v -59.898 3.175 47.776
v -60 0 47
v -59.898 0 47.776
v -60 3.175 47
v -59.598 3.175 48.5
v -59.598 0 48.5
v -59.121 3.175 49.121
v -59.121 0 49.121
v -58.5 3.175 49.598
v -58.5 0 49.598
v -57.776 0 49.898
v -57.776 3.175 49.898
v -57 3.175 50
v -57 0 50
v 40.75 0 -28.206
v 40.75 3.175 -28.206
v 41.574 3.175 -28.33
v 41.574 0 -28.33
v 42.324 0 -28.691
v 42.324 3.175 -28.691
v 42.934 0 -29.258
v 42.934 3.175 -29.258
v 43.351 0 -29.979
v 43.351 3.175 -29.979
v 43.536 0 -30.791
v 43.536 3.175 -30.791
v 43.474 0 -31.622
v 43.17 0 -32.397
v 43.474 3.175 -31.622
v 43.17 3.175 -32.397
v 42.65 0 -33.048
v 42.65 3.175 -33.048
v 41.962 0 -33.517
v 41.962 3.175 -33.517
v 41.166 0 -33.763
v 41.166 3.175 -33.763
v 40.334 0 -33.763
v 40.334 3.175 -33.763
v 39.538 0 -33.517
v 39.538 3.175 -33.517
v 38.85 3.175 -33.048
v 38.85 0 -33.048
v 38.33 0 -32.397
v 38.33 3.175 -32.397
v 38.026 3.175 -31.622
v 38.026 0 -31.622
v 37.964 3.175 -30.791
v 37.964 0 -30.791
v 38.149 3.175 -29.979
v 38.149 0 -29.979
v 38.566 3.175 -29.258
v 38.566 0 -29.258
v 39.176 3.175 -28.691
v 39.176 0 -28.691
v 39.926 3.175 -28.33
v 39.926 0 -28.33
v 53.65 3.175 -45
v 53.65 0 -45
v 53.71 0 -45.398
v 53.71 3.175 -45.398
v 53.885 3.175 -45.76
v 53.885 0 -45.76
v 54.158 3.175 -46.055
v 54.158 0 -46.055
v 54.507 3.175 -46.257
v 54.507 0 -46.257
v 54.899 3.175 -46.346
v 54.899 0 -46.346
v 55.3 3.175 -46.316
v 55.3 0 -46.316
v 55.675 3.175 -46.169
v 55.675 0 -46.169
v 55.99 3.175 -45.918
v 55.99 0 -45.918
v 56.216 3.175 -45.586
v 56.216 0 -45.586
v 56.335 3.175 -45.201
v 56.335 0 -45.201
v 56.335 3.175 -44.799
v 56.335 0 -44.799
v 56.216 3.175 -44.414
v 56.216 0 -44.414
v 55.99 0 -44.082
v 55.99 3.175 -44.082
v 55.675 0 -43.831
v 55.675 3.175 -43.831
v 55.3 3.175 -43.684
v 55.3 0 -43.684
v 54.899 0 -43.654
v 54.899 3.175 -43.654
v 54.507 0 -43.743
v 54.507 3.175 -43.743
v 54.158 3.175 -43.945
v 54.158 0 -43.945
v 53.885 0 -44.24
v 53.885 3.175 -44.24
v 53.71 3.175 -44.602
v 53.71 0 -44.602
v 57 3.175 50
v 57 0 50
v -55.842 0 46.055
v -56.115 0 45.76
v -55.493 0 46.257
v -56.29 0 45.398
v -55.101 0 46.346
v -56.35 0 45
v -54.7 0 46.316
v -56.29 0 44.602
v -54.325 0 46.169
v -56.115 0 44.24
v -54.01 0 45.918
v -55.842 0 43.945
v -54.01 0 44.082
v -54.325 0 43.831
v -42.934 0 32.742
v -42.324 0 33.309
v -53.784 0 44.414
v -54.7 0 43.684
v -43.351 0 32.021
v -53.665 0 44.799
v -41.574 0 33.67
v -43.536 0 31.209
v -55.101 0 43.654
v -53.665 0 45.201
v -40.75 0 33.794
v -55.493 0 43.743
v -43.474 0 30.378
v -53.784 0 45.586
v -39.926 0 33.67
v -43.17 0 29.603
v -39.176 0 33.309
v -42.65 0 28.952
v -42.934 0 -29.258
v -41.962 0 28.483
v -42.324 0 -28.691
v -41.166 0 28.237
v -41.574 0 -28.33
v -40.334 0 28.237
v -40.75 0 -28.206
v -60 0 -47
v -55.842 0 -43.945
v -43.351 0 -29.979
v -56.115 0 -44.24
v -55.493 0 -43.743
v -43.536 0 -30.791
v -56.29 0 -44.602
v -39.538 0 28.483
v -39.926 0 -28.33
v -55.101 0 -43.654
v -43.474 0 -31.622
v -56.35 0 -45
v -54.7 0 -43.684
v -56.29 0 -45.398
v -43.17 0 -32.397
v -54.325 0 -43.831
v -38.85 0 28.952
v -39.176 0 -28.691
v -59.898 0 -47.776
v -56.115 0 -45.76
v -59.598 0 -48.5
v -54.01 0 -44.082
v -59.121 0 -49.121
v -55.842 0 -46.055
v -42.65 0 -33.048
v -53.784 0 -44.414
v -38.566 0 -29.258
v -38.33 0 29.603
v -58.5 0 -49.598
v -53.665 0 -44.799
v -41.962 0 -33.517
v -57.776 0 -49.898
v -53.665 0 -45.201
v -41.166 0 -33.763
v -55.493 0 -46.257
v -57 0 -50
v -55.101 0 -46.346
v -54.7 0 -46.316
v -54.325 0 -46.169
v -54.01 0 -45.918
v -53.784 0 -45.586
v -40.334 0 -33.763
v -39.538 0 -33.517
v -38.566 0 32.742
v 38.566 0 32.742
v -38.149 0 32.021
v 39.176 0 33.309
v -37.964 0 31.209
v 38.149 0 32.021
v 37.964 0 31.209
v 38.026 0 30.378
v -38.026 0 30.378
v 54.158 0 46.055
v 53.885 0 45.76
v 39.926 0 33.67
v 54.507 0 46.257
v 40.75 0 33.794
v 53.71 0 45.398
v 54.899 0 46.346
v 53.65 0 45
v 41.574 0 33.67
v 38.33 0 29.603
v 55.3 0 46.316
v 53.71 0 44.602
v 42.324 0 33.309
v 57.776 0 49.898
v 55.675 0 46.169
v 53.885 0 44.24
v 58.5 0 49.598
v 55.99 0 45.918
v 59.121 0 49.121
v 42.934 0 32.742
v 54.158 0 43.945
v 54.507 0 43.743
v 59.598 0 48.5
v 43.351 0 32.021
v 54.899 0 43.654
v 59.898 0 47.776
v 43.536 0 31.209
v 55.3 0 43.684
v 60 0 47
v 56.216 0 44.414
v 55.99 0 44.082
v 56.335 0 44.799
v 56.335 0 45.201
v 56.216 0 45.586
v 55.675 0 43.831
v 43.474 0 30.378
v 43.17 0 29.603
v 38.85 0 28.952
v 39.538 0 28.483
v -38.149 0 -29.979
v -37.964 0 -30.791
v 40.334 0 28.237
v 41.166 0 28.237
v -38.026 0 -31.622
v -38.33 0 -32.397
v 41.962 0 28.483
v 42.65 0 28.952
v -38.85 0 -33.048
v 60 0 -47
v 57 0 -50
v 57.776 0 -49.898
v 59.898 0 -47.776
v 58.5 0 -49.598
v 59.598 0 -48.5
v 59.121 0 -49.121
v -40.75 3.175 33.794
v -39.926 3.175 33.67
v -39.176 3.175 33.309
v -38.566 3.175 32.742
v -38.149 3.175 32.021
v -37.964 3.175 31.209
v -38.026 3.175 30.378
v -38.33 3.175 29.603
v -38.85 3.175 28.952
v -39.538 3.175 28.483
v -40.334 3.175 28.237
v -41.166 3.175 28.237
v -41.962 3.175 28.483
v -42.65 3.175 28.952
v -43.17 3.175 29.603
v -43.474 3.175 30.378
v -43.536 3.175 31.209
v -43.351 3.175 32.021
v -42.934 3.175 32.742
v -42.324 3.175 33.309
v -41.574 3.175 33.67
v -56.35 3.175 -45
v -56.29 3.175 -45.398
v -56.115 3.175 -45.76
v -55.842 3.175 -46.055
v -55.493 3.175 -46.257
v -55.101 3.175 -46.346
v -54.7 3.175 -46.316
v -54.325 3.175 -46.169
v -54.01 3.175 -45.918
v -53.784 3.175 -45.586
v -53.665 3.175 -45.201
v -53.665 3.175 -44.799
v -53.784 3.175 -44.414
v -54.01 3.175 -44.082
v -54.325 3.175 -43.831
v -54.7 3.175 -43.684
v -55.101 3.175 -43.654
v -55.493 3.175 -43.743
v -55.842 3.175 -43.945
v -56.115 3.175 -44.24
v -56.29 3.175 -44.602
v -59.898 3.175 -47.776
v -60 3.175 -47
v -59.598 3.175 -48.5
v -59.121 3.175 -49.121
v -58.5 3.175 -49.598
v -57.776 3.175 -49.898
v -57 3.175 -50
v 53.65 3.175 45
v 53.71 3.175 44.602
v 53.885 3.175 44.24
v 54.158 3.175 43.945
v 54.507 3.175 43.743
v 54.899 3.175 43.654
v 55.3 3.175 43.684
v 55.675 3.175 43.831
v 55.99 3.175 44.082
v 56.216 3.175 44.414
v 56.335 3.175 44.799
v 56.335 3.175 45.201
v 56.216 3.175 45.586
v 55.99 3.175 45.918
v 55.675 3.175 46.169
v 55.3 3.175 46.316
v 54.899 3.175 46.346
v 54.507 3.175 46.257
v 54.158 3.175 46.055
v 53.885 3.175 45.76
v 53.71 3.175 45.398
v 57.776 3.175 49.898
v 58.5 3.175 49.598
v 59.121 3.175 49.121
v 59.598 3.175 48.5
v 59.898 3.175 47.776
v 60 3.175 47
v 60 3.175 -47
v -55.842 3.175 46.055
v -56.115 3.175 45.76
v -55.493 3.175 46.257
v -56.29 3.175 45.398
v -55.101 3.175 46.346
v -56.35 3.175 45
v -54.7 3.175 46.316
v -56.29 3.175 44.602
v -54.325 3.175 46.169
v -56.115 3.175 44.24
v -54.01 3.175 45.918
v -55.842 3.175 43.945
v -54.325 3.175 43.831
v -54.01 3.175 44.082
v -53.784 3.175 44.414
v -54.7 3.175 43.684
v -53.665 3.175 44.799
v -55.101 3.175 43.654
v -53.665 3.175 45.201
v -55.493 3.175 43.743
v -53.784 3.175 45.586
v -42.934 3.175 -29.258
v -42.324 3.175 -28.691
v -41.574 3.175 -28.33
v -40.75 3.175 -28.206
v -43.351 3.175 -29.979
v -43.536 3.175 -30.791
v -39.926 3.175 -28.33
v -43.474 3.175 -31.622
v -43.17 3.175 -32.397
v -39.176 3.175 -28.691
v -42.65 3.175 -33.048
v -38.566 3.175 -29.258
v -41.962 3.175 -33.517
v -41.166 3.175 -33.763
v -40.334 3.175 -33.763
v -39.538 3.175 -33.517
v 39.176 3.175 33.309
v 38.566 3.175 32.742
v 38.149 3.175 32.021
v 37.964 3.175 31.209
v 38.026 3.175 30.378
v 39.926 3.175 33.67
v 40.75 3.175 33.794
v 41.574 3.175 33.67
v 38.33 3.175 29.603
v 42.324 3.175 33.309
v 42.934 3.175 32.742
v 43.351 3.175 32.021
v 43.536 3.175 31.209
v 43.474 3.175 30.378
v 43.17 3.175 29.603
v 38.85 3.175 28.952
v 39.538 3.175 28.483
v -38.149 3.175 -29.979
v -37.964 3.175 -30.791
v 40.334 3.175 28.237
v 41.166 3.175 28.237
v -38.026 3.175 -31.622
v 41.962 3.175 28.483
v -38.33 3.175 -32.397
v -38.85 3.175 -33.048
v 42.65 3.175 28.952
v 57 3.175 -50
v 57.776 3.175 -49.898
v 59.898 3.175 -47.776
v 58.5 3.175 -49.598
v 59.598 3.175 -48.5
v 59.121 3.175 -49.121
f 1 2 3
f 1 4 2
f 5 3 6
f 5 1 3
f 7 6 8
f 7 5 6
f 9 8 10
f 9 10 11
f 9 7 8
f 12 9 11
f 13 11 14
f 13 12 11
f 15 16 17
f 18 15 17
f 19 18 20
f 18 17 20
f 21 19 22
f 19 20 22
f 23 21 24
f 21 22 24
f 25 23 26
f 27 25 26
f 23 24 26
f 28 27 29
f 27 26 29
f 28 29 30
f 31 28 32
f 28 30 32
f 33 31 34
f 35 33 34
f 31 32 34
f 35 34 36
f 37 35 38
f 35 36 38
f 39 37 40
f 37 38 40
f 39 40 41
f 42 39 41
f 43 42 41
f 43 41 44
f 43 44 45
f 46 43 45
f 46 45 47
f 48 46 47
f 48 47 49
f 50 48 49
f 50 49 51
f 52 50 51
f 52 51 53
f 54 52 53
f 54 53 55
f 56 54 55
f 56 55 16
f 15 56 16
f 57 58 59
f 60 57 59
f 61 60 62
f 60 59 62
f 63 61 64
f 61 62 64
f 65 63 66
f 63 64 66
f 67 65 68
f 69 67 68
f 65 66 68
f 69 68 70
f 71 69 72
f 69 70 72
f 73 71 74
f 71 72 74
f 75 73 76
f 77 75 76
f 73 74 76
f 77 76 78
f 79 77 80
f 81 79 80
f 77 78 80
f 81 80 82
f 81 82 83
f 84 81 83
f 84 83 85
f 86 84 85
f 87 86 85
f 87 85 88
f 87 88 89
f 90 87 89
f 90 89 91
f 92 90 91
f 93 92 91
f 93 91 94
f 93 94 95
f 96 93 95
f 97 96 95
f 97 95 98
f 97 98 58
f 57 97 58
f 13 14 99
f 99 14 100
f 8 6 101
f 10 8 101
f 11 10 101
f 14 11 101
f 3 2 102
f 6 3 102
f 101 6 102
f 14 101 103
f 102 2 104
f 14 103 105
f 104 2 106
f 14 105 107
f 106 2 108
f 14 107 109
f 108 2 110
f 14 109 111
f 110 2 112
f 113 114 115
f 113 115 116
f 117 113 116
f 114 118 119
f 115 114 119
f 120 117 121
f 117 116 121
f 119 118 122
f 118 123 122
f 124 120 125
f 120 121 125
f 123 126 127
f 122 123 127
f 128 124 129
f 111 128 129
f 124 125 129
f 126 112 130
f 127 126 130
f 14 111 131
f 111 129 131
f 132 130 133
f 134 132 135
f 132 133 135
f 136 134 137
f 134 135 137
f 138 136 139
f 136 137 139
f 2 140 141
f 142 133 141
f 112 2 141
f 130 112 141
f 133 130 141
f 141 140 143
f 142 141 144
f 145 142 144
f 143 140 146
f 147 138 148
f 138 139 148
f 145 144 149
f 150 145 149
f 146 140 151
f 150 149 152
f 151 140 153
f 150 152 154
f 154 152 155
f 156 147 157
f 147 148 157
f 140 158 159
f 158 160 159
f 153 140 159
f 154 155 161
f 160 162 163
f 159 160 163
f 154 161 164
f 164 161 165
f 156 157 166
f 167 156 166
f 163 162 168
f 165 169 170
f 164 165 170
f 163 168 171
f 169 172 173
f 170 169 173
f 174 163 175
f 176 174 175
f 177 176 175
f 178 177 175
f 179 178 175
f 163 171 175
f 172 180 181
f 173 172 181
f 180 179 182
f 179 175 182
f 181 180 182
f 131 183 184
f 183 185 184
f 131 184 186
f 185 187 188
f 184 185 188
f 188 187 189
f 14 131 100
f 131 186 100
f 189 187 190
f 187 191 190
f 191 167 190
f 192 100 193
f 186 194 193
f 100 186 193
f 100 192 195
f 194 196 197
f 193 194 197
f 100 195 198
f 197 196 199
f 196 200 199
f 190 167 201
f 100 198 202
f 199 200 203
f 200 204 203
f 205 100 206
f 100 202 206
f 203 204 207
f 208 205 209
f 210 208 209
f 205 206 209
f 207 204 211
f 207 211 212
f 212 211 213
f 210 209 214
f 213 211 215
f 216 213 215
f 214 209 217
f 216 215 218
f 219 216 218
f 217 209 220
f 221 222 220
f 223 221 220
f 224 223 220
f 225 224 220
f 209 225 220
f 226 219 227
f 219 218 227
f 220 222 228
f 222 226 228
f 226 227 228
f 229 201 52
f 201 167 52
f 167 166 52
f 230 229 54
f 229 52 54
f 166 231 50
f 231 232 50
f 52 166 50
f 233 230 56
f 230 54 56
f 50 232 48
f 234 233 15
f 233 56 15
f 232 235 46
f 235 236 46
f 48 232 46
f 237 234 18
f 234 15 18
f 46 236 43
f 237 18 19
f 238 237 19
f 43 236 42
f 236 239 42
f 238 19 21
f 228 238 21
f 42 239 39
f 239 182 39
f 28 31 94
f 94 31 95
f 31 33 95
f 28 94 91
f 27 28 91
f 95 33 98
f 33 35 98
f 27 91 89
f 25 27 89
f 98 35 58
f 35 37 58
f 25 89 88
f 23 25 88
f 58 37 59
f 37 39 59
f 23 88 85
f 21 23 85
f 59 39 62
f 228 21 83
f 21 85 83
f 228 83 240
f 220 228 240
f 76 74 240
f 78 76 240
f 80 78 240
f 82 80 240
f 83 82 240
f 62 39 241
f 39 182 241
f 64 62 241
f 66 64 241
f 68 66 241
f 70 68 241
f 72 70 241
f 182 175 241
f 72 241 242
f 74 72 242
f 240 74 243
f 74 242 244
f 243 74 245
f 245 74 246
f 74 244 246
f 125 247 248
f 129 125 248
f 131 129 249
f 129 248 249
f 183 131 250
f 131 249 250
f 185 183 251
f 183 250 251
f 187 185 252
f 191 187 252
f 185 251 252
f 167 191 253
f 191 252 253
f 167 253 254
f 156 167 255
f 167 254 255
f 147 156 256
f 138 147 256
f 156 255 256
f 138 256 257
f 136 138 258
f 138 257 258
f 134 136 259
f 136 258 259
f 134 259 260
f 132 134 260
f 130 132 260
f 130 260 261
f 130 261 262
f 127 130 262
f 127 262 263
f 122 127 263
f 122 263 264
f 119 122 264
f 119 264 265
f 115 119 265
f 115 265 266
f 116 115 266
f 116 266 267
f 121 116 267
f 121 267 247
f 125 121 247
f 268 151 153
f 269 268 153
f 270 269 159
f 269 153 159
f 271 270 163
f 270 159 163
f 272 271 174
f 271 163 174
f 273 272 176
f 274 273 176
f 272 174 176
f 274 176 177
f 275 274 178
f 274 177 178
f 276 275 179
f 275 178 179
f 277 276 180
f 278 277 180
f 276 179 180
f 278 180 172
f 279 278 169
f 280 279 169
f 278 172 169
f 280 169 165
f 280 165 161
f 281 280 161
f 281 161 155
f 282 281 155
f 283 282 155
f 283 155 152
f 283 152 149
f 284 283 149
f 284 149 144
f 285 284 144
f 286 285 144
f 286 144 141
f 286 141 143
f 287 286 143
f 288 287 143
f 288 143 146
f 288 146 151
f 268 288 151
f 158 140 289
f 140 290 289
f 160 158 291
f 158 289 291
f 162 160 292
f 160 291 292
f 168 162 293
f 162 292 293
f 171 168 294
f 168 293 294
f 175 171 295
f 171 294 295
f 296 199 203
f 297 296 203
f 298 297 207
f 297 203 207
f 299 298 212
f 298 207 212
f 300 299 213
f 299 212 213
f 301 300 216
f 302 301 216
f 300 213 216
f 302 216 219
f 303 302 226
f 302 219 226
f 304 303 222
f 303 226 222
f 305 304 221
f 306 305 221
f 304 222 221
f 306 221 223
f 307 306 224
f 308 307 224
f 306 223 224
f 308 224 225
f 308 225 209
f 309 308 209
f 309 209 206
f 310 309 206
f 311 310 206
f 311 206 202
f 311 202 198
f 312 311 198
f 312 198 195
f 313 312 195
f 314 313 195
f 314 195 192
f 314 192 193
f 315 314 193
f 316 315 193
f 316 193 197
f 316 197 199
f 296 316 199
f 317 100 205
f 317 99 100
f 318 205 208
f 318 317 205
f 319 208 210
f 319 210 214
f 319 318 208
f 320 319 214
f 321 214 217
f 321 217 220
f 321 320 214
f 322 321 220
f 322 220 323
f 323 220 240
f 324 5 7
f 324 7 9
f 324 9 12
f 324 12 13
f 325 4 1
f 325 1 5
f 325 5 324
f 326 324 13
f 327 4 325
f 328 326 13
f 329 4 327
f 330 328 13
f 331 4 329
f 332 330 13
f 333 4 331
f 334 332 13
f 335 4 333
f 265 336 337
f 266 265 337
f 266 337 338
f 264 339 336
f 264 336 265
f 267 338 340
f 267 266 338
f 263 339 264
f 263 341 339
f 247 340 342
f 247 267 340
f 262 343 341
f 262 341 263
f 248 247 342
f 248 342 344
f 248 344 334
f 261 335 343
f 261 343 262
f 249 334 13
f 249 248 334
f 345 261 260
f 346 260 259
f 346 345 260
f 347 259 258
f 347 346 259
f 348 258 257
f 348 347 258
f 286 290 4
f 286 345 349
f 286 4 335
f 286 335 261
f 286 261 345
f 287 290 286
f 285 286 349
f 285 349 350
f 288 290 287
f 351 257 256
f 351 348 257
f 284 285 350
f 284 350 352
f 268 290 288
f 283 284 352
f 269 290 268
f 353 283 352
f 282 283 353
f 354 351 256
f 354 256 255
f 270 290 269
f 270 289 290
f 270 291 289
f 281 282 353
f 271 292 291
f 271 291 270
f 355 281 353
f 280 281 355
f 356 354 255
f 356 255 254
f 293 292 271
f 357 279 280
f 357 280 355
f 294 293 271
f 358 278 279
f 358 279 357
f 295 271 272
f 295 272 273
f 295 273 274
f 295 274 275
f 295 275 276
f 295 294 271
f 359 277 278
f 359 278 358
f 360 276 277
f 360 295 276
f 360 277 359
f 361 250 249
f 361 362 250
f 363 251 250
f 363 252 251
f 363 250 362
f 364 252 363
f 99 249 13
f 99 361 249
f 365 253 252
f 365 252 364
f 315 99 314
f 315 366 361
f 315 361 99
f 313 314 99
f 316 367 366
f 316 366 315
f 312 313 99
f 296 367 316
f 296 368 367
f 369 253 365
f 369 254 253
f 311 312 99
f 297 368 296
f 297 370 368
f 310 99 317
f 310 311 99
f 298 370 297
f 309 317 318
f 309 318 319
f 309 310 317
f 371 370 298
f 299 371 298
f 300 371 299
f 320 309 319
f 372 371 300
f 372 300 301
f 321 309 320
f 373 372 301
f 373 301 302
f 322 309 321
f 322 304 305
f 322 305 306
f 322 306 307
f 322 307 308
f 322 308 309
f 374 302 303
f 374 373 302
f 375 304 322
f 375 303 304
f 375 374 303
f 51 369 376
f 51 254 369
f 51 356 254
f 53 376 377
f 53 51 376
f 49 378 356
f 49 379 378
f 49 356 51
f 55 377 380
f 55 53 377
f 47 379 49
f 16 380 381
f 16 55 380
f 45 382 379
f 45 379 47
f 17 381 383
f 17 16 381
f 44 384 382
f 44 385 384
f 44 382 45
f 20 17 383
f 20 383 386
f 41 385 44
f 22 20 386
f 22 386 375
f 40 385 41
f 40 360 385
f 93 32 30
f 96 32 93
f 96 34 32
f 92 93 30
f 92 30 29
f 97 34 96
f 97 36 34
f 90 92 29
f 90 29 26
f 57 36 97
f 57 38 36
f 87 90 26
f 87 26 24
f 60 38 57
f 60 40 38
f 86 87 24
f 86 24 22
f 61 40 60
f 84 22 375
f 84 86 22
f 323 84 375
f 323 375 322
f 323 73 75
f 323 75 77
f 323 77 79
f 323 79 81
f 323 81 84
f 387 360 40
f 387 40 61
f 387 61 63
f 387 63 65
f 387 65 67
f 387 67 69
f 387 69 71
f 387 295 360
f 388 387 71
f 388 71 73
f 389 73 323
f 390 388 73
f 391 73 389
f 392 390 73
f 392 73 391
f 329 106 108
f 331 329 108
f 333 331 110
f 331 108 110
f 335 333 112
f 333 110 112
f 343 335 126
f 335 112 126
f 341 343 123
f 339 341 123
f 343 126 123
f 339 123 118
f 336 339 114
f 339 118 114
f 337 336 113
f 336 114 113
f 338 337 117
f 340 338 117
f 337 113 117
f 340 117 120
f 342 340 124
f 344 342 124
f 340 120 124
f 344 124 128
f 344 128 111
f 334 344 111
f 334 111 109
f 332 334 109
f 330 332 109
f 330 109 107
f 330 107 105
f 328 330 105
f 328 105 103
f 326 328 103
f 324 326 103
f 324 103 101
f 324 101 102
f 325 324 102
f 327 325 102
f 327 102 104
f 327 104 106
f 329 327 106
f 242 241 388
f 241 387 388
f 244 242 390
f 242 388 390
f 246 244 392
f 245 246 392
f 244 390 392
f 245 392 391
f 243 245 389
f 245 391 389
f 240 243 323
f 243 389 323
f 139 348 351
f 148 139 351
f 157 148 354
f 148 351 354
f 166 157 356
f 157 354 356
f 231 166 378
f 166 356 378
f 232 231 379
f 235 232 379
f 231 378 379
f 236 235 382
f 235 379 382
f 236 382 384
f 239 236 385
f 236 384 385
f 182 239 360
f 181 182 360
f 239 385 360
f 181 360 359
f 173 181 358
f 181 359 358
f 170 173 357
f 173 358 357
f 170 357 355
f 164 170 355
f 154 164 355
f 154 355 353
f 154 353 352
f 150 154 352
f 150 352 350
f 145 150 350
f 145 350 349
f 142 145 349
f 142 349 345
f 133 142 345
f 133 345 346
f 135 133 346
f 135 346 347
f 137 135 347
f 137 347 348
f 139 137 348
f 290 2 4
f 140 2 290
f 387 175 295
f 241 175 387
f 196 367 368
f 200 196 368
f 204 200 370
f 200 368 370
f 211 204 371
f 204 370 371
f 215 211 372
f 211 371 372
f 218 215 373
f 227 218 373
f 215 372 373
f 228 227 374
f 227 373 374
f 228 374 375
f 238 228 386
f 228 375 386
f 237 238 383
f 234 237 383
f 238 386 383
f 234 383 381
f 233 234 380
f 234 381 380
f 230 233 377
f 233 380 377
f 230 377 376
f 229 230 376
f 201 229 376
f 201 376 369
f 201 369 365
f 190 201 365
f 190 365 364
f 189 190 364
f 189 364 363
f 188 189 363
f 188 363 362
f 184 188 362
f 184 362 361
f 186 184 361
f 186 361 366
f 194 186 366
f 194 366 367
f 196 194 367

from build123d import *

# Parameters (mm, degrees)
SKETCH1_W              = 120
SKETCH1_H              = 100
BOSS_EXTRUDE1_DEPTH    = 3.175
SKETCH2_R              = 2.794
CUT_EXTRUDE1_DEPTH     = 79.167004708
M2_5_CLEARANCE_HOLE1_D = 2.7
FILLET1_R              = 3


with BuildPart() as part:
    # Sketch1 → Boss-Extrude1 (new body)
    with BuildSketch(Plane(origin=(0, 0, 0), x_dir=(1, 0, 0), z_dir=(0, 1, 0))):
        Rectangle(SKETCH1_W, SKETCH1_H)
    extrude(amount=BOSS_EXTRUDE1_DEPTH)

    # Sketch2 → Cut-Extrude1 (cut, through all)
    with BuildSketch(Plane(origin=(0, 3.175, 0), x_dir=(1, 0, 0), z_dir=(0, 1, 0))):
        with Locations(Location((-40.75, 31, 0), (0, 0, 270))):
            Circle(SKETCH2_R)
        with Locations(Location((-40.75, -31, 0), (0, 0, 270))):
            Circle(SKETCH2_R)
        with Locations(Location((40.75, -31, 0), (0, 0, 270))):
            Circle(SKETCH2_R)
        with Locations(Location((40.75, 31, 0), (0, 0, 270))):
            Circle(SKETCH2_R)
    extrude(amount=-CUT_EXTRUDE1_DEPTH, mode=Mode.SUBTRACT)

    # M2.5 Clearance Hole1 (through all)
    with Locations(Plane(origin=(0, 3.175, 0), x_dir=(1, 0, 0), z_dir=(0, 1, 0))):
        with Locations((-55, 45), (55, 45), (-55, -45), (55, -45)):
            Hole(M2_5_CLEARANCE_HOLE1_D / 2)

    # Fillet1
    fillet1_edges = [part.edges().sort_by_distance(p)[0] for p in [
        (-60, 1.5875, -50),
        (60, 1.5875, -50),
        (60, 1.5875, 50),
        (-60, 1.5875, 50),
    ]]
    fillet(fillet1_edges, radius=FILLET1_R)


solid = part.part
